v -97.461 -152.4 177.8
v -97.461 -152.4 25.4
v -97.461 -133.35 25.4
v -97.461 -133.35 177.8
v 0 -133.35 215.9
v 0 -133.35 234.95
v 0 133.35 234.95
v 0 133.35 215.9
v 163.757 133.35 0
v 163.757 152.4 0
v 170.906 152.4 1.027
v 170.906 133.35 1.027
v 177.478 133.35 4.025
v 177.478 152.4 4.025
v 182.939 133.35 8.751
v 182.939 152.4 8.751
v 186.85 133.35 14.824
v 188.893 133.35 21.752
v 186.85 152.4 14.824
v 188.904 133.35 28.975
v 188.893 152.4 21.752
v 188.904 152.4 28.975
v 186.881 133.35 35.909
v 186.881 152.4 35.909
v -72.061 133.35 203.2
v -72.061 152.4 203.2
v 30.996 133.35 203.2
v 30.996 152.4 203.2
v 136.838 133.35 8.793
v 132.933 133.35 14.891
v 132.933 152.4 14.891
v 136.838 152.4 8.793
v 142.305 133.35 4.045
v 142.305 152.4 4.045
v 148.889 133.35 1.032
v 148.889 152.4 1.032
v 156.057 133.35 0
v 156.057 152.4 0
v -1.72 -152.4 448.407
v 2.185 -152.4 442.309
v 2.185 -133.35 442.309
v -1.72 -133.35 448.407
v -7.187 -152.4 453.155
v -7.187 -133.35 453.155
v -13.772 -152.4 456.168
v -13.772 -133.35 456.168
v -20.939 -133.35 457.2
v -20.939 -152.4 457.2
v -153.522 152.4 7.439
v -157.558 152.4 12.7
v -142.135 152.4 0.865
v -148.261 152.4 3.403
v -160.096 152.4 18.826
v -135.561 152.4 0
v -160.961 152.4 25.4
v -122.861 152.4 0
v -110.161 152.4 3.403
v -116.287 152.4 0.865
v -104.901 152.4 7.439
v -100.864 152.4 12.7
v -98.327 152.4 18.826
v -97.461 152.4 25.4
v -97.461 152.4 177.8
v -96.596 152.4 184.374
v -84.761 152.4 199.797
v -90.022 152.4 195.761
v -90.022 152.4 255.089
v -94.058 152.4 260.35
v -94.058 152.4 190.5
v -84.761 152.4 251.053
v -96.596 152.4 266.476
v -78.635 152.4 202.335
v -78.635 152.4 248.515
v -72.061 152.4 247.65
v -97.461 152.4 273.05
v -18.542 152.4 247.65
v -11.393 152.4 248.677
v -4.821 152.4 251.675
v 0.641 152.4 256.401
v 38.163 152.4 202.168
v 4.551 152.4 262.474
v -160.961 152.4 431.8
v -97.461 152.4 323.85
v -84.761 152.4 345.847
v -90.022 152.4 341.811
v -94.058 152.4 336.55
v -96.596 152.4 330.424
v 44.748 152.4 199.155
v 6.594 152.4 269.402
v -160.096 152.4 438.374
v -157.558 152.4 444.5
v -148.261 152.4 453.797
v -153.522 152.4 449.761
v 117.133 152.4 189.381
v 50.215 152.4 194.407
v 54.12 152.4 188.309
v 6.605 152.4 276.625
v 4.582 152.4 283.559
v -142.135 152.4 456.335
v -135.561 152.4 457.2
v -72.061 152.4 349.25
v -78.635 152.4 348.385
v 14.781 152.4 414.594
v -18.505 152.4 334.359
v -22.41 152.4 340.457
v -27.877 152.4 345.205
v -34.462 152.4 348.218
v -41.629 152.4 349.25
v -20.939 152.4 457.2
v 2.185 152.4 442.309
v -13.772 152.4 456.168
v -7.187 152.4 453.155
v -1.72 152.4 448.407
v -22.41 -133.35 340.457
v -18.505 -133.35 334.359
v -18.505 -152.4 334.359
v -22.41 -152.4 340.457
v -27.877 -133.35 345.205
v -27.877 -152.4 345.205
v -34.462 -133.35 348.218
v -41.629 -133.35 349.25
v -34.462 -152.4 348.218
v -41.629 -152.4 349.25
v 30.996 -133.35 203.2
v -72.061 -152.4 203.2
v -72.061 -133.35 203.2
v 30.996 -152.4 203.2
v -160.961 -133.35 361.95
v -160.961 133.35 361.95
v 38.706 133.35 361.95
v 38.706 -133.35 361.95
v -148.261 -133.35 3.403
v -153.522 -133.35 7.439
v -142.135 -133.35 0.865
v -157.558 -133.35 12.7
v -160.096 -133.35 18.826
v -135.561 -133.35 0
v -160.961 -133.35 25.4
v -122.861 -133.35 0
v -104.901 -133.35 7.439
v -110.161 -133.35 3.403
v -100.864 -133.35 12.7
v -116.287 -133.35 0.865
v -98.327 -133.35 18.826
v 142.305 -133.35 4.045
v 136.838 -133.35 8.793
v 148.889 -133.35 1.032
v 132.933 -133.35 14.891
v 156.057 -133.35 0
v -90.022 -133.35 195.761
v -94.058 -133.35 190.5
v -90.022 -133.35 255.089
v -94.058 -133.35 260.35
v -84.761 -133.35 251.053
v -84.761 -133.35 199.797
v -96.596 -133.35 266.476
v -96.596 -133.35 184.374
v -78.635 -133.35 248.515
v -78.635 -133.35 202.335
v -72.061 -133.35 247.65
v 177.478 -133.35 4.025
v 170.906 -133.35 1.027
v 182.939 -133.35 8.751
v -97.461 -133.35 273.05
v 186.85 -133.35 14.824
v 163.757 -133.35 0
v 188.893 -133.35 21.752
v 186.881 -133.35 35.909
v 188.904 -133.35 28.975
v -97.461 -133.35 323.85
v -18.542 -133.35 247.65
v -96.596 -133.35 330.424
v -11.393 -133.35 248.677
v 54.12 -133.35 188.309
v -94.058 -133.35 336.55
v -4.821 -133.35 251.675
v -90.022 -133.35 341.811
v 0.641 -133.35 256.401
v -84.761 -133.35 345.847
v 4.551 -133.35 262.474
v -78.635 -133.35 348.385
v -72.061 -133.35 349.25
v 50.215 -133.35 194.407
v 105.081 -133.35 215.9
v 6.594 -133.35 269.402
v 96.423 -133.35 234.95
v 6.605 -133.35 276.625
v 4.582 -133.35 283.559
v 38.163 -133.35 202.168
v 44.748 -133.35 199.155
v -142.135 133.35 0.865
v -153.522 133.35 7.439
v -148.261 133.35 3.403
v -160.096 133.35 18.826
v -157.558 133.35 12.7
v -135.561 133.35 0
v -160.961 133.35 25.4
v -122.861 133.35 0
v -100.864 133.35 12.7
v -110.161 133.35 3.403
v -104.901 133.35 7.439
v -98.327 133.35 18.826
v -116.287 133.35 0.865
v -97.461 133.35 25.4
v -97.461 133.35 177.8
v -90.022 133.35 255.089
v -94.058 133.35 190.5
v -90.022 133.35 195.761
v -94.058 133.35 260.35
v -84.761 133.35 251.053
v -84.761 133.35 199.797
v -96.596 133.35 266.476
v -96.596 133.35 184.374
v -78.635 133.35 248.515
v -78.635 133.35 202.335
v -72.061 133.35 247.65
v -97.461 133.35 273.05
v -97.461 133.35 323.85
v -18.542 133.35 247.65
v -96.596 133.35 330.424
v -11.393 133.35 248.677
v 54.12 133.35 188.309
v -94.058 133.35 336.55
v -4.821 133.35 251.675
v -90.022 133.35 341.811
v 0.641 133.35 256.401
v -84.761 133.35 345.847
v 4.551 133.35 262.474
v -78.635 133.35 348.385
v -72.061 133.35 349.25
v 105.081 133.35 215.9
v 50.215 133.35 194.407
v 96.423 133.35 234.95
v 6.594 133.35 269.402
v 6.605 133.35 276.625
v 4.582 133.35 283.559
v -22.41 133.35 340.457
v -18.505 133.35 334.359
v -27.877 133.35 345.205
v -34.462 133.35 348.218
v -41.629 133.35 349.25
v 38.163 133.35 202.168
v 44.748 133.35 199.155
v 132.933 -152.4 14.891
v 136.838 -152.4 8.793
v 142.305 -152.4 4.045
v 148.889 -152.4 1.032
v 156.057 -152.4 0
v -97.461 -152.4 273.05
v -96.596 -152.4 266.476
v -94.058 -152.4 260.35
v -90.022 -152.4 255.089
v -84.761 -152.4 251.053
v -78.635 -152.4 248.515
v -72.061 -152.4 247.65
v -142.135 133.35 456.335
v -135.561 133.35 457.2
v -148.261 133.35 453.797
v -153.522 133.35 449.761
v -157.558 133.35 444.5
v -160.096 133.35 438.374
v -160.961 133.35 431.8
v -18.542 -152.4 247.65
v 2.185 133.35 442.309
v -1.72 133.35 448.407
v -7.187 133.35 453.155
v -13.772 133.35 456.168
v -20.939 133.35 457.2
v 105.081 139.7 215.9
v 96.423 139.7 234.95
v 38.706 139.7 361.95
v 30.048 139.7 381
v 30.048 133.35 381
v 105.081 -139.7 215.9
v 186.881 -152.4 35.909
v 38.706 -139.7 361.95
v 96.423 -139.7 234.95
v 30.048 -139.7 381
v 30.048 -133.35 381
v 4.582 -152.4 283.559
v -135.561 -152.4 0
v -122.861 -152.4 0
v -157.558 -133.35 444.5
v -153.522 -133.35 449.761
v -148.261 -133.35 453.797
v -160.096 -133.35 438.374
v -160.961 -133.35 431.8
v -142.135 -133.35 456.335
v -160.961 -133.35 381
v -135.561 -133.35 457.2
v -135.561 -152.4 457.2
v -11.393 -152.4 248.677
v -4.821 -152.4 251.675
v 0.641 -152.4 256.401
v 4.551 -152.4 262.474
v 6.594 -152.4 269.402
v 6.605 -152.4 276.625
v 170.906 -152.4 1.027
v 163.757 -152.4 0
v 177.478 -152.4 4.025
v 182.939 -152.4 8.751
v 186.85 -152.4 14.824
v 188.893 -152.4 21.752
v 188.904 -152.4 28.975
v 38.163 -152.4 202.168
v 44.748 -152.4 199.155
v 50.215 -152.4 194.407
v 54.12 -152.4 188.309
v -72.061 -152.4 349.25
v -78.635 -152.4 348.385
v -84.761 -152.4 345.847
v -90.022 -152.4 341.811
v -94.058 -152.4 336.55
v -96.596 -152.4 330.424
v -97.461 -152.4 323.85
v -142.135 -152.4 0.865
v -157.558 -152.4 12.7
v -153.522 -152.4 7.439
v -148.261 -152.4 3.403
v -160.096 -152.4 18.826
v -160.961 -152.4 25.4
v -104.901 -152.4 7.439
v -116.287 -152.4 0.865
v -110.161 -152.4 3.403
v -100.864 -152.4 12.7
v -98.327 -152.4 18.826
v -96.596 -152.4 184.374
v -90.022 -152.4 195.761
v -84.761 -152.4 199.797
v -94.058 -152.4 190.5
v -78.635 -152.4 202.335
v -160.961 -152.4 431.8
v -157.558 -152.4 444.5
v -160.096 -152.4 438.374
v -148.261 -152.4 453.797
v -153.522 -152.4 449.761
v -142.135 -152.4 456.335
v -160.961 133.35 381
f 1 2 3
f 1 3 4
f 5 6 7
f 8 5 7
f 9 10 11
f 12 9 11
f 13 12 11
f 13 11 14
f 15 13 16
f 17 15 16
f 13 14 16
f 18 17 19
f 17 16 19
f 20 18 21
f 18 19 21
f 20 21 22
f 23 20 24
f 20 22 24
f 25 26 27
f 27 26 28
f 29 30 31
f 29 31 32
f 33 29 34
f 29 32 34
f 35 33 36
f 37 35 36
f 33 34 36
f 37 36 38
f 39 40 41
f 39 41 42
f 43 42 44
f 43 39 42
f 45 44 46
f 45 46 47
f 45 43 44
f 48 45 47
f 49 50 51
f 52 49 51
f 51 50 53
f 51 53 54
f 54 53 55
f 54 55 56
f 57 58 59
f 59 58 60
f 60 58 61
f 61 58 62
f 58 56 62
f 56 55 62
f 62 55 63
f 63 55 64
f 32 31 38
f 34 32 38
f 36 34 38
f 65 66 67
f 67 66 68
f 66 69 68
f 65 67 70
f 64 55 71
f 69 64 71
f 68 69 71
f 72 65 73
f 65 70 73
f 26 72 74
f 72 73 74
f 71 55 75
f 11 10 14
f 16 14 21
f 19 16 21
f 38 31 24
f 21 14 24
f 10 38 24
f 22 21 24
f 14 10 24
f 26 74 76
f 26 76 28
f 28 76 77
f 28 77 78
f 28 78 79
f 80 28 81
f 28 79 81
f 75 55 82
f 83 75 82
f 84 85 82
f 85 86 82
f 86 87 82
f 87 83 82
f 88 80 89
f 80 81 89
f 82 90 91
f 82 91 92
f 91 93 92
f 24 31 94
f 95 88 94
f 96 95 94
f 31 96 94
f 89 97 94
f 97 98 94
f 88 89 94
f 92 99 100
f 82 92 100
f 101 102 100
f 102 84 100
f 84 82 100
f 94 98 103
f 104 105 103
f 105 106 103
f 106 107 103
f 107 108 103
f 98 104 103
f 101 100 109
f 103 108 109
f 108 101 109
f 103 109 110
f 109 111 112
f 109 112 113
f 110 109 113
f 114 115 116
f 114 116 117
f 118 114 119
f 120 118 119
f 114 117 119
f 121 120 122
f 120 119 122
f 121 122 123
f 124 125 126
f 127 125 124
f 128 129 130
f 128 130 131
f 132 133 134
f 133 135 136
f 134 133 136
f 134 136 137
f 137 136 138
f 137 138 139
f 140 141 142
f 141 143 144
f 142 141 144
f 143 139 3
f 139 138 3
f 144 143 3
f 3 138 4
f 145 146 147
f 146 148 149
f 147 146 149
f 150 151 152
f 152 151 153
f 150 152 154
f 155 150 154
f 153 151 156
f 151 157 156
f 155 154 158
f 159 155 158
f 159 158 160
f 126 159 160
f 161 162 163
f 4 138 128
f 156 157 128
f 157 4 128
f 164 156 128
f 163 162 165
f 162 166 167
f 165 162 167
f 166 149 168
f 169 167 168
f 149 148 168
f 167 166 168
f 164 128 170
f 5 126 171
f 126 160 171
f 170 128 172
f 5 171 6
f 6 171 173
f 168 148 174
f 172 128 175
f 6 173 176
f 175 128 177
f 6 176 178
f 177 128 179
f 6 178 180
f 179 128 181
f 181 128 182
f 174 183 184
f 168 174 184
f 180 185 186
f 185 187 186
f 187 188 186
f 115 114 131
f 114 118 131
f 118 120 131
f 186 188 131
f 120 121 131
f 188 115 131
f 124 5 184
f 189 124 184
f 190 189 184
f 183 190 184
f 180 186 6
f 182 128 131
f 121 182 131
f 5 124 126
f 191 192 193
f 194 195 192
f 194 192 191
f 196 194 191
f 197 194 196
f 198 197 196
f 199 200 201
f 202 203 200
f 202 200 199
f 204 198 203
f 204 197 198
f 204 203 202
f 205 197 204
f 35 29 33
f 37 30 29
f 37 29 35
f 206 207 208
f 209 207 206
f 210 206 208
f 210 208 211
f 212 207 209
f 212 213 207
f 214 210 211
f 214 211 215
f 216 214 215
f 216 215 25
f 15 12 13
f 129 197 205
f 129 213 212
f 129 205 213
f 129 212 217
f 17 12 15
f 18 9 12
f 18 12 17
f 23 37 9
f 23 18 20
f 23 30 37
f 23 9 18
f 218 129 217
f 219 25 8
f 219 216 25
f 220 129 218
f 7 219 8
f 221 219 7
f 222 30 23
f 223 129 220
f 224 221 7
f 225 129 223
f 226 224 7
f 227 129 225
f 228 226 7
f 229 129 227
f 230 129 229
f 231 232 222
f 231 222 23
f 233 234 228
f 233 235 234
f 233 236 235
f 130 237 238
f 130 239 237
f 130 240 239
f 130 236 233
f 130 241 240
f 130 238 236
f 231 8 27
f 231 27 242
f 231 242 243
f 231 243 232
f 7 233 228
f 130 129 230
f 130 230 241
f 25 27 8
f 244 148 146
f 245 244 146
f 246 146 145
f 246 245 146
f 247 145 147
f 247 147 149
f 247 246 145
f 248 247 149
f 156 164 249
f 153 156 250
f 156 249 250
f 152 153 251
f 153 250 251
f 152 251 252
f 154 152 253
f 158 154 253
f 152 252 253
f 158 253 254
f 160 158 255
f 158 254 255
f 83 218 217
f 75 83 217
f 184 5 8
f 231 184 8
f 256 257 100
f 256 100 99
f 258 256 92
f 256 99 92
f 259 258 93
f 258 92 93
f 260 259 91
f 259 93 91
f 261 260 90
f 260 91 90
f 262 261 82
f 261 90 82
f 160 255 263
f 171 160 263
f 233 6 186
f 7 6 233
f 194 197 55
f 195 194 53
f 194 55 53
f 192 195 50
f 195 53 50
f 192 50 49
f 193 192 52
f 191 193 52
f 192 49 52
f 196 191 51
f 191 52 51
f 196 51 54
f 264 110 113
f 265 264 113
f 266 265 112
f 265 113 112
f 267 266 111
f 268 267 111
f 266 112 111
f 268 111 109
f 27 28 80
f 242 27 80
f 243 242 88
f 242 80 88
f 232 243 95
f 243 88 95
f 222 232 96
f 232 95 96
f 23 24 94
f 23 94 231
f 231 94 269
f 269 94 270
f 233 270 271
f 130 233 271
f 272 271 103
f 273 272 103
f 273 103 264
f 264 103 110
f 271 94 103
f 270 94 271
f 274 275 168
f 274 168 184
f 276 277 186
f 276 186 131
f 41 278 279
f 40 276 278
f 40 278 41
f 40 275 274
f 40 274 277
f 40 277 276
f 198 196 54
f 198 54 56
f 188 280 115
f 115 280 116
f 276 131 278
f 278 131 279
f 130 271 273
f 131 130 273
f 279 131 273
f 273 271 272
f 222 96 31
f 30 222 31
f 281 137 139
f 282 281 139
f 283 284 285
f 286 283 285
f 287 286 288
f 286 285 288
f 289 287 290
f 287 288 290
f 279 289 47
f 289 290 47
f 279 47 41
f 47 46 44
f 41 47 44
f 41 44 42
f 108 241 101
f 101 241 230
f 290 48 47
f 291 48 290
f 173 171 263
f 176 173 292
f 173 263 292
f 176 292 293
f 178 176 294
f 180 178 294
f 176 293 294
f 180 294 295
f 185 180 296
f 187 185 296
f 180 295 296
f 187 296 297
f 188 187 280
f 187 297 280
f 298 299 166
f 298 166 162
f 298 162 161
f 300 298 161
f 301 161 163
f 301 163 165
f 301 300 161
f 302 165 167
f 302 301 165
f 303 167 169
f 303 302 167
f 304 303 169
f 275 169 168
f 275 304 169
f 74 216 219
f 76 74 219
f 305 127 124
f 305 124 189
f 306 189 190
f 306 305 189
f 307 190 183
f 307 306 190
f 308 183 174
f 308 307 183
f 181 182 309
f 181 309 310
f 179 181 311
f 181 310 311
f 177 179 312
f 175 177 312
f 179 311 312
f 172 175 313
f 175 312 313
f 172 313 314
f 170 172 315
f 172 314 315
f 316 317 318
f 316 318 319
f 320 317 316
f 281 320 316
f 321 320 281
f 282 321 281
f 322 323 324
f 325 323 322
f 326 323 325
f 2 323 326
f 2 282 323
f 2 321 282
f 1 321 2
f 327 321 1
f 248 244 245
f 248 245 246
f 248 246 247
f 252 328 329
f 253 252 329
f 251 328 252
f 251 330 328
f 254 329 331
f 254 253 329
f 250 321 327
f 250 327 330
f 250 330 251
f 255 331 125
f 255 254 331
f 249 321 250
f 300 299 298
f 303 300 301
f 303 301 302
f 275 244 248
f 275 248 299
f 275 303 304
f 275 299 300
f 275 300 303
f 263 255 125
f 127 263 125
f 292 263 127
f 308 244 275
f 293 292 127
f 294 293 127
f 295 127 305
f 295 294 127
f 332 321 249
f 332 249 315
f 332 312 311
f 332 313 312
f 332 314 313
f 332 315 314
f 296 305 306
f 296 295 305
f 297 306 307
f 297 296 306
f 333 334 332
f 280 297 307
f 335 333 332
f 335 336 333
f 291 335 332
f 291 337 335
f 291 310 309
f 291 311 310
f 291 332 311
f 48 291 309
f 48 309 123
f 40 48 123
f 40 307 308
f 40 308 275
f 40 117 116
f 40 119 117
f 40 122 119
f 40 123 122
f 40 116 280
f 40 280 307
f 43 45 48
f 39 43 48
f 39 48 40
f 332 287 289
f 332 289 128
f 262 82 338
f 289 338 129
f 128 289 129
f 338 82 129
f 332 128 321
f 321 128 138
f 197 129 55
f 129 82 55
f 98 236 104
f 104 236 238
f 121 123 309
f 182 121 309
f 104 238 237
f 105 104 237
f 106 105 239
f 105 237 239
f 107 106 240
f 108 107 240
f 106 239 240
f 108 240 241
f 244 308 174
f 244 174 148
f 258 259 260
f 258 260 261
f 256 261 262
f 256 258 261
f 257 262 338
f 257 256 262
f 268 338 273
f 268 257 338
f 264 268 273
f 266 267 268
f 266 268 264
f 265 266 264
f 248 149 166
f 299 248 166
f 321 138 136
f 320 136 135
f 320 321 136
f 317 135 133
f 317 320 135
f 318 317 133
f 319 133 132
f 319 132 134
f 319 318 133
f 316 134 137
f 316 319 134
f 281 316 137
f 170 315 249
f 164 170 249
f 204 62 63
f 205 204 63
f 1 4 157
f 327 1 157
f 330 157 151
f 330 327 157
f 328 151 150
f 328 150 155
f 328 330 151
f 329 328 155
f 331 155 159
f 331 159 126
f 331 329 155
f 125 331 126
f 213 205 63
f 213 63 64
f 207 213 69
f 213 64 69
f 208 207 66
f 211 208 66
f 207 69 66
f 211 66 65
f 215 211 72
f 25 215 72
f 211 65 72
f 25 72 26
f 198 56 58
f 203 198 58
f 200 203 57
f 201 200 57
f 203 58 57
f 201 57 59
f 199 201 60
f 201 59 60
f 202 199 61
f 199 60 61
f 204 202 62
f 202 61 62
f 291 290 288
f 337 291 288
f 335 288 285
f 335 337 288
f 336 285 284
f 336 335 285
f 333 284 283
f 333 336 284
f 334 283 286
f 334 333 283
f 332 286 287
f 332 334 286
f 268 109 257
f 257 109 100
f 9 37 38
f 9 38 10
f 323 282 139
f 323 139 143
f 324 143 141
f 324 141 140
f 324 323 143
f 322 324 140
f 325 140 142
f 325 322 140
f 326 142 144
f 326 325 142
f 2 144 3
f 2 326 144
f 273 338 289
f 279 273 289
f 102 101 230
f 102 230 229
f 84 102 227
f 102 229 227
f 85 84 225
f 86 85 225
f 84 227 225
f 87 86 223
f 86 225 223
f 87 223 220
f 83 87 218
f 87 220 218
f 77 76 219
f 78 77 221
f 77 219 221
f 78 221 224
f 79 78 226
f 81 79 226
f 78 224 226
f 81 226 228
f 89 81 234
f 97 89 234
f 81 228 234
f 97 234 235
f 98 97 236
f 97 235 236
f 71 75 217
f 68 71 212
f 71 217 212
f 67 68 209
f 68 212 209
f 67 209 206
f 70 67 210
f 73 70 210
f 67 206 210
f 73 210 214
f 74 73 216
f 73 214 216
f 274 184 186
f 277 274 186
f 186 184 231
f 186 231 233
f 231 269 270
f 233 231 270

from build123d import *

# Parameters (mm, degrees)
F5_DEPTH  = 19.05
F6_DEPTH  = 19.05
F7_W      = 279.4
F7_H      = 19.05
F8_DEPTH  = 112.776
F9_W      = 279.4
F9_H      = 19.05
F10_DEPTH = 209.804
F12_DEPTH = 375.92
F15_DEPTH = 313.436


with BuildPart() as f5:
    # F4 (on offset) → F5 (new body)
    with BuildSketch(Plane.XZ.offset(152.4)):
        with BuildLine():
            Line((156.056568, 0), (163.756519, 0))
            ThreePointArc((163.756519, 0), (185.111738, 11.648106), (186.880512, 35.909087))
            Line((186.880512, 35.909087), (2.185208, 442.309087))
            ThreePointArc((2.185208, 442.309087), (-7.186892, 453.15522), (-20.938786, 457.2))
            Line((-20.938786, 457.2), (-135.561358, 457.2))
            ThreePointArc((-135.561358, 457.2), (-153.52187, 449.760512), (-160.961358, 431.8))
            Line((-160.961358, 431.8), (-160.961358, 25.4))
            ThreePointArc((-160.961358, 25.4), (-153.52187, 7.439488), (-135.561358, 0))
            Line((-135.561358, 0), (-122.861358, 0))
            ThreePointArc((-122.861358, 0), (-104.900846, 7.439488), (-97.461358, 25.4))
            Line((-97.461358, 25.4), (-97.461358, 177.8))
            ThreePointArc((-97.461358, 177.8), (-90.02187, 195.760512), (-72.061358, 203.2))
            Line((-72.061358, 203.2), (30.995779, 203.2))
            ThreePointArc((30.995779, 203.2), (44.747674, 199.15522), (54.119773, 188.309087))
            Line((54.119773, 188.309087), (132.932575, 14.890913))
            ThreePointArc((132.932575, 14.890913), (142.304674, 4.04478), (156.056568, 0))
        make_face()
    extrude(amount=-F5_DEPTH)



with BuildPart() as f6:
    # F3 (on offset) → F6 (new body)
    with BuildSketch(Plane.XZ.offset(-152.4)):
        with BuildLine():
            Line((156.056568, 0), (163.756519, 0))
            ThreePointArc((163.756519, 0), (185.111738, 11.648106), (186.880512, 35.909087))
            Line((186.880512, 35.909087), (2.185208, 442.309087))
            ThreePointArc((2.185208, 442.309087), (-7.186892, 453.15522), (-20.938786, 457.2))
            Line((-20.938786, 457.2), (-135.561358, 457.2))
            ThreePointArc((-135.561358, 457.2), (-153.52187, 449.760512), (-160.961358, 431.8))
            Line((-160.961358, 431.8), (-160.961358, 25.4))
            ThreePointArc((-160.961358, 25.4), (-153.52187, 7.439488), (-135.561358, 0))
            Line((-135.561358, 0), (-122.861358, 0))
            ThreePointArc((-122.861358, 0), (-104.900846, 7.439488), (-97.461358, 25.4))
            Line((-97.461358, 25.4), (-97.461358, 177.8))
            ThreePointArc((-97.461358, 177.8), (-90.02187, 195.760512), (-72.061358, 203.2))
            Line((-72.061358, 203.2), (30.995779, 203.2))
            ThreePointArc((30.995779, 203.2), (44.747674, 199.15522), (54.119773, 188.309087))
            Line((54.119773, 188.309087), (132.932575, 14.890913))
            ThreePointArc((132.932575, 14.890913), (142.304674, 4.04478), (156.056568, 0))
        make_face()
    extrude(amount=F6_DEPTH)


with BuildPart() as f5_1:
    add(f5.part)

    add(f6.part)  # F8 merges F6
    # F7 (on Right) → F8 (join)
    with BuildSketch(Plane.YZ):
        with Locations((0, 225.425)):
            Rectangle(F7_W, F7_H)
    extrude(amount=F8_DEPTH)

    # F9 (on face) → F10 (join)
    with BuildSketch(Plane(origin=(-160.961358, 0, 0), x_dir=(0, -1, 0), z_dir=(-1, 0, 0))):
        with Locations((0, 371.475)):
            Rectangle(F9_W, F9_H)
    extrude(amount=-F10_DEPTH)

    # F11 (on face) → F12 (cut)
    with BuildSketch(Plane(origin=(0, 152.4, 0), x_dir=(-1, 0, 0), z_dir=(0, 1, 0))):
        Polygon((-117.13268, 189.380877), (-14.780929, 414.593705), (-39.657071, 420.538783), (-147.453333, 203.160607), align=None)
    extrude(amount=-F12_DEPTH, mode=Mode.SUBTRACT)

    # F14 (on face) → F15 (cut)
    with BuildSketch(Plane.XZ.offset(152.4)):
        with BuildLine():
            ThreePointArc((-18.542245, 247.65), (2.812975, 259.298106), (4.581749, 283.559087))
            Line((4.581749, 283.559087), (-18.505164, 334.359087))
            ThreePointArc((-18.505164, 334.359087), (-27.877264, 345.20522), (-41.629158, 349.25))
            Line((-41.629158, 349.25), (-72.061358, 349.25))
            ThreePointArc((-72.061358, 349.25), (-90.02187, 341.810512), (-97.461358, 323.85))
            Line((-97.461358, 323.85), (-97.461358, 273.05))
            ThreePointArc((-97.461358, 273.05), (-90.02187, 255.089488), (-72.061358, 247.65))
            Line((-72.061358, 247.65), (-18.542245, 247.65))
        make_face()
    extrude(amount=-F15_DEPTH, mode=Mode.SUBTRACT)


solid = f5_1.part
